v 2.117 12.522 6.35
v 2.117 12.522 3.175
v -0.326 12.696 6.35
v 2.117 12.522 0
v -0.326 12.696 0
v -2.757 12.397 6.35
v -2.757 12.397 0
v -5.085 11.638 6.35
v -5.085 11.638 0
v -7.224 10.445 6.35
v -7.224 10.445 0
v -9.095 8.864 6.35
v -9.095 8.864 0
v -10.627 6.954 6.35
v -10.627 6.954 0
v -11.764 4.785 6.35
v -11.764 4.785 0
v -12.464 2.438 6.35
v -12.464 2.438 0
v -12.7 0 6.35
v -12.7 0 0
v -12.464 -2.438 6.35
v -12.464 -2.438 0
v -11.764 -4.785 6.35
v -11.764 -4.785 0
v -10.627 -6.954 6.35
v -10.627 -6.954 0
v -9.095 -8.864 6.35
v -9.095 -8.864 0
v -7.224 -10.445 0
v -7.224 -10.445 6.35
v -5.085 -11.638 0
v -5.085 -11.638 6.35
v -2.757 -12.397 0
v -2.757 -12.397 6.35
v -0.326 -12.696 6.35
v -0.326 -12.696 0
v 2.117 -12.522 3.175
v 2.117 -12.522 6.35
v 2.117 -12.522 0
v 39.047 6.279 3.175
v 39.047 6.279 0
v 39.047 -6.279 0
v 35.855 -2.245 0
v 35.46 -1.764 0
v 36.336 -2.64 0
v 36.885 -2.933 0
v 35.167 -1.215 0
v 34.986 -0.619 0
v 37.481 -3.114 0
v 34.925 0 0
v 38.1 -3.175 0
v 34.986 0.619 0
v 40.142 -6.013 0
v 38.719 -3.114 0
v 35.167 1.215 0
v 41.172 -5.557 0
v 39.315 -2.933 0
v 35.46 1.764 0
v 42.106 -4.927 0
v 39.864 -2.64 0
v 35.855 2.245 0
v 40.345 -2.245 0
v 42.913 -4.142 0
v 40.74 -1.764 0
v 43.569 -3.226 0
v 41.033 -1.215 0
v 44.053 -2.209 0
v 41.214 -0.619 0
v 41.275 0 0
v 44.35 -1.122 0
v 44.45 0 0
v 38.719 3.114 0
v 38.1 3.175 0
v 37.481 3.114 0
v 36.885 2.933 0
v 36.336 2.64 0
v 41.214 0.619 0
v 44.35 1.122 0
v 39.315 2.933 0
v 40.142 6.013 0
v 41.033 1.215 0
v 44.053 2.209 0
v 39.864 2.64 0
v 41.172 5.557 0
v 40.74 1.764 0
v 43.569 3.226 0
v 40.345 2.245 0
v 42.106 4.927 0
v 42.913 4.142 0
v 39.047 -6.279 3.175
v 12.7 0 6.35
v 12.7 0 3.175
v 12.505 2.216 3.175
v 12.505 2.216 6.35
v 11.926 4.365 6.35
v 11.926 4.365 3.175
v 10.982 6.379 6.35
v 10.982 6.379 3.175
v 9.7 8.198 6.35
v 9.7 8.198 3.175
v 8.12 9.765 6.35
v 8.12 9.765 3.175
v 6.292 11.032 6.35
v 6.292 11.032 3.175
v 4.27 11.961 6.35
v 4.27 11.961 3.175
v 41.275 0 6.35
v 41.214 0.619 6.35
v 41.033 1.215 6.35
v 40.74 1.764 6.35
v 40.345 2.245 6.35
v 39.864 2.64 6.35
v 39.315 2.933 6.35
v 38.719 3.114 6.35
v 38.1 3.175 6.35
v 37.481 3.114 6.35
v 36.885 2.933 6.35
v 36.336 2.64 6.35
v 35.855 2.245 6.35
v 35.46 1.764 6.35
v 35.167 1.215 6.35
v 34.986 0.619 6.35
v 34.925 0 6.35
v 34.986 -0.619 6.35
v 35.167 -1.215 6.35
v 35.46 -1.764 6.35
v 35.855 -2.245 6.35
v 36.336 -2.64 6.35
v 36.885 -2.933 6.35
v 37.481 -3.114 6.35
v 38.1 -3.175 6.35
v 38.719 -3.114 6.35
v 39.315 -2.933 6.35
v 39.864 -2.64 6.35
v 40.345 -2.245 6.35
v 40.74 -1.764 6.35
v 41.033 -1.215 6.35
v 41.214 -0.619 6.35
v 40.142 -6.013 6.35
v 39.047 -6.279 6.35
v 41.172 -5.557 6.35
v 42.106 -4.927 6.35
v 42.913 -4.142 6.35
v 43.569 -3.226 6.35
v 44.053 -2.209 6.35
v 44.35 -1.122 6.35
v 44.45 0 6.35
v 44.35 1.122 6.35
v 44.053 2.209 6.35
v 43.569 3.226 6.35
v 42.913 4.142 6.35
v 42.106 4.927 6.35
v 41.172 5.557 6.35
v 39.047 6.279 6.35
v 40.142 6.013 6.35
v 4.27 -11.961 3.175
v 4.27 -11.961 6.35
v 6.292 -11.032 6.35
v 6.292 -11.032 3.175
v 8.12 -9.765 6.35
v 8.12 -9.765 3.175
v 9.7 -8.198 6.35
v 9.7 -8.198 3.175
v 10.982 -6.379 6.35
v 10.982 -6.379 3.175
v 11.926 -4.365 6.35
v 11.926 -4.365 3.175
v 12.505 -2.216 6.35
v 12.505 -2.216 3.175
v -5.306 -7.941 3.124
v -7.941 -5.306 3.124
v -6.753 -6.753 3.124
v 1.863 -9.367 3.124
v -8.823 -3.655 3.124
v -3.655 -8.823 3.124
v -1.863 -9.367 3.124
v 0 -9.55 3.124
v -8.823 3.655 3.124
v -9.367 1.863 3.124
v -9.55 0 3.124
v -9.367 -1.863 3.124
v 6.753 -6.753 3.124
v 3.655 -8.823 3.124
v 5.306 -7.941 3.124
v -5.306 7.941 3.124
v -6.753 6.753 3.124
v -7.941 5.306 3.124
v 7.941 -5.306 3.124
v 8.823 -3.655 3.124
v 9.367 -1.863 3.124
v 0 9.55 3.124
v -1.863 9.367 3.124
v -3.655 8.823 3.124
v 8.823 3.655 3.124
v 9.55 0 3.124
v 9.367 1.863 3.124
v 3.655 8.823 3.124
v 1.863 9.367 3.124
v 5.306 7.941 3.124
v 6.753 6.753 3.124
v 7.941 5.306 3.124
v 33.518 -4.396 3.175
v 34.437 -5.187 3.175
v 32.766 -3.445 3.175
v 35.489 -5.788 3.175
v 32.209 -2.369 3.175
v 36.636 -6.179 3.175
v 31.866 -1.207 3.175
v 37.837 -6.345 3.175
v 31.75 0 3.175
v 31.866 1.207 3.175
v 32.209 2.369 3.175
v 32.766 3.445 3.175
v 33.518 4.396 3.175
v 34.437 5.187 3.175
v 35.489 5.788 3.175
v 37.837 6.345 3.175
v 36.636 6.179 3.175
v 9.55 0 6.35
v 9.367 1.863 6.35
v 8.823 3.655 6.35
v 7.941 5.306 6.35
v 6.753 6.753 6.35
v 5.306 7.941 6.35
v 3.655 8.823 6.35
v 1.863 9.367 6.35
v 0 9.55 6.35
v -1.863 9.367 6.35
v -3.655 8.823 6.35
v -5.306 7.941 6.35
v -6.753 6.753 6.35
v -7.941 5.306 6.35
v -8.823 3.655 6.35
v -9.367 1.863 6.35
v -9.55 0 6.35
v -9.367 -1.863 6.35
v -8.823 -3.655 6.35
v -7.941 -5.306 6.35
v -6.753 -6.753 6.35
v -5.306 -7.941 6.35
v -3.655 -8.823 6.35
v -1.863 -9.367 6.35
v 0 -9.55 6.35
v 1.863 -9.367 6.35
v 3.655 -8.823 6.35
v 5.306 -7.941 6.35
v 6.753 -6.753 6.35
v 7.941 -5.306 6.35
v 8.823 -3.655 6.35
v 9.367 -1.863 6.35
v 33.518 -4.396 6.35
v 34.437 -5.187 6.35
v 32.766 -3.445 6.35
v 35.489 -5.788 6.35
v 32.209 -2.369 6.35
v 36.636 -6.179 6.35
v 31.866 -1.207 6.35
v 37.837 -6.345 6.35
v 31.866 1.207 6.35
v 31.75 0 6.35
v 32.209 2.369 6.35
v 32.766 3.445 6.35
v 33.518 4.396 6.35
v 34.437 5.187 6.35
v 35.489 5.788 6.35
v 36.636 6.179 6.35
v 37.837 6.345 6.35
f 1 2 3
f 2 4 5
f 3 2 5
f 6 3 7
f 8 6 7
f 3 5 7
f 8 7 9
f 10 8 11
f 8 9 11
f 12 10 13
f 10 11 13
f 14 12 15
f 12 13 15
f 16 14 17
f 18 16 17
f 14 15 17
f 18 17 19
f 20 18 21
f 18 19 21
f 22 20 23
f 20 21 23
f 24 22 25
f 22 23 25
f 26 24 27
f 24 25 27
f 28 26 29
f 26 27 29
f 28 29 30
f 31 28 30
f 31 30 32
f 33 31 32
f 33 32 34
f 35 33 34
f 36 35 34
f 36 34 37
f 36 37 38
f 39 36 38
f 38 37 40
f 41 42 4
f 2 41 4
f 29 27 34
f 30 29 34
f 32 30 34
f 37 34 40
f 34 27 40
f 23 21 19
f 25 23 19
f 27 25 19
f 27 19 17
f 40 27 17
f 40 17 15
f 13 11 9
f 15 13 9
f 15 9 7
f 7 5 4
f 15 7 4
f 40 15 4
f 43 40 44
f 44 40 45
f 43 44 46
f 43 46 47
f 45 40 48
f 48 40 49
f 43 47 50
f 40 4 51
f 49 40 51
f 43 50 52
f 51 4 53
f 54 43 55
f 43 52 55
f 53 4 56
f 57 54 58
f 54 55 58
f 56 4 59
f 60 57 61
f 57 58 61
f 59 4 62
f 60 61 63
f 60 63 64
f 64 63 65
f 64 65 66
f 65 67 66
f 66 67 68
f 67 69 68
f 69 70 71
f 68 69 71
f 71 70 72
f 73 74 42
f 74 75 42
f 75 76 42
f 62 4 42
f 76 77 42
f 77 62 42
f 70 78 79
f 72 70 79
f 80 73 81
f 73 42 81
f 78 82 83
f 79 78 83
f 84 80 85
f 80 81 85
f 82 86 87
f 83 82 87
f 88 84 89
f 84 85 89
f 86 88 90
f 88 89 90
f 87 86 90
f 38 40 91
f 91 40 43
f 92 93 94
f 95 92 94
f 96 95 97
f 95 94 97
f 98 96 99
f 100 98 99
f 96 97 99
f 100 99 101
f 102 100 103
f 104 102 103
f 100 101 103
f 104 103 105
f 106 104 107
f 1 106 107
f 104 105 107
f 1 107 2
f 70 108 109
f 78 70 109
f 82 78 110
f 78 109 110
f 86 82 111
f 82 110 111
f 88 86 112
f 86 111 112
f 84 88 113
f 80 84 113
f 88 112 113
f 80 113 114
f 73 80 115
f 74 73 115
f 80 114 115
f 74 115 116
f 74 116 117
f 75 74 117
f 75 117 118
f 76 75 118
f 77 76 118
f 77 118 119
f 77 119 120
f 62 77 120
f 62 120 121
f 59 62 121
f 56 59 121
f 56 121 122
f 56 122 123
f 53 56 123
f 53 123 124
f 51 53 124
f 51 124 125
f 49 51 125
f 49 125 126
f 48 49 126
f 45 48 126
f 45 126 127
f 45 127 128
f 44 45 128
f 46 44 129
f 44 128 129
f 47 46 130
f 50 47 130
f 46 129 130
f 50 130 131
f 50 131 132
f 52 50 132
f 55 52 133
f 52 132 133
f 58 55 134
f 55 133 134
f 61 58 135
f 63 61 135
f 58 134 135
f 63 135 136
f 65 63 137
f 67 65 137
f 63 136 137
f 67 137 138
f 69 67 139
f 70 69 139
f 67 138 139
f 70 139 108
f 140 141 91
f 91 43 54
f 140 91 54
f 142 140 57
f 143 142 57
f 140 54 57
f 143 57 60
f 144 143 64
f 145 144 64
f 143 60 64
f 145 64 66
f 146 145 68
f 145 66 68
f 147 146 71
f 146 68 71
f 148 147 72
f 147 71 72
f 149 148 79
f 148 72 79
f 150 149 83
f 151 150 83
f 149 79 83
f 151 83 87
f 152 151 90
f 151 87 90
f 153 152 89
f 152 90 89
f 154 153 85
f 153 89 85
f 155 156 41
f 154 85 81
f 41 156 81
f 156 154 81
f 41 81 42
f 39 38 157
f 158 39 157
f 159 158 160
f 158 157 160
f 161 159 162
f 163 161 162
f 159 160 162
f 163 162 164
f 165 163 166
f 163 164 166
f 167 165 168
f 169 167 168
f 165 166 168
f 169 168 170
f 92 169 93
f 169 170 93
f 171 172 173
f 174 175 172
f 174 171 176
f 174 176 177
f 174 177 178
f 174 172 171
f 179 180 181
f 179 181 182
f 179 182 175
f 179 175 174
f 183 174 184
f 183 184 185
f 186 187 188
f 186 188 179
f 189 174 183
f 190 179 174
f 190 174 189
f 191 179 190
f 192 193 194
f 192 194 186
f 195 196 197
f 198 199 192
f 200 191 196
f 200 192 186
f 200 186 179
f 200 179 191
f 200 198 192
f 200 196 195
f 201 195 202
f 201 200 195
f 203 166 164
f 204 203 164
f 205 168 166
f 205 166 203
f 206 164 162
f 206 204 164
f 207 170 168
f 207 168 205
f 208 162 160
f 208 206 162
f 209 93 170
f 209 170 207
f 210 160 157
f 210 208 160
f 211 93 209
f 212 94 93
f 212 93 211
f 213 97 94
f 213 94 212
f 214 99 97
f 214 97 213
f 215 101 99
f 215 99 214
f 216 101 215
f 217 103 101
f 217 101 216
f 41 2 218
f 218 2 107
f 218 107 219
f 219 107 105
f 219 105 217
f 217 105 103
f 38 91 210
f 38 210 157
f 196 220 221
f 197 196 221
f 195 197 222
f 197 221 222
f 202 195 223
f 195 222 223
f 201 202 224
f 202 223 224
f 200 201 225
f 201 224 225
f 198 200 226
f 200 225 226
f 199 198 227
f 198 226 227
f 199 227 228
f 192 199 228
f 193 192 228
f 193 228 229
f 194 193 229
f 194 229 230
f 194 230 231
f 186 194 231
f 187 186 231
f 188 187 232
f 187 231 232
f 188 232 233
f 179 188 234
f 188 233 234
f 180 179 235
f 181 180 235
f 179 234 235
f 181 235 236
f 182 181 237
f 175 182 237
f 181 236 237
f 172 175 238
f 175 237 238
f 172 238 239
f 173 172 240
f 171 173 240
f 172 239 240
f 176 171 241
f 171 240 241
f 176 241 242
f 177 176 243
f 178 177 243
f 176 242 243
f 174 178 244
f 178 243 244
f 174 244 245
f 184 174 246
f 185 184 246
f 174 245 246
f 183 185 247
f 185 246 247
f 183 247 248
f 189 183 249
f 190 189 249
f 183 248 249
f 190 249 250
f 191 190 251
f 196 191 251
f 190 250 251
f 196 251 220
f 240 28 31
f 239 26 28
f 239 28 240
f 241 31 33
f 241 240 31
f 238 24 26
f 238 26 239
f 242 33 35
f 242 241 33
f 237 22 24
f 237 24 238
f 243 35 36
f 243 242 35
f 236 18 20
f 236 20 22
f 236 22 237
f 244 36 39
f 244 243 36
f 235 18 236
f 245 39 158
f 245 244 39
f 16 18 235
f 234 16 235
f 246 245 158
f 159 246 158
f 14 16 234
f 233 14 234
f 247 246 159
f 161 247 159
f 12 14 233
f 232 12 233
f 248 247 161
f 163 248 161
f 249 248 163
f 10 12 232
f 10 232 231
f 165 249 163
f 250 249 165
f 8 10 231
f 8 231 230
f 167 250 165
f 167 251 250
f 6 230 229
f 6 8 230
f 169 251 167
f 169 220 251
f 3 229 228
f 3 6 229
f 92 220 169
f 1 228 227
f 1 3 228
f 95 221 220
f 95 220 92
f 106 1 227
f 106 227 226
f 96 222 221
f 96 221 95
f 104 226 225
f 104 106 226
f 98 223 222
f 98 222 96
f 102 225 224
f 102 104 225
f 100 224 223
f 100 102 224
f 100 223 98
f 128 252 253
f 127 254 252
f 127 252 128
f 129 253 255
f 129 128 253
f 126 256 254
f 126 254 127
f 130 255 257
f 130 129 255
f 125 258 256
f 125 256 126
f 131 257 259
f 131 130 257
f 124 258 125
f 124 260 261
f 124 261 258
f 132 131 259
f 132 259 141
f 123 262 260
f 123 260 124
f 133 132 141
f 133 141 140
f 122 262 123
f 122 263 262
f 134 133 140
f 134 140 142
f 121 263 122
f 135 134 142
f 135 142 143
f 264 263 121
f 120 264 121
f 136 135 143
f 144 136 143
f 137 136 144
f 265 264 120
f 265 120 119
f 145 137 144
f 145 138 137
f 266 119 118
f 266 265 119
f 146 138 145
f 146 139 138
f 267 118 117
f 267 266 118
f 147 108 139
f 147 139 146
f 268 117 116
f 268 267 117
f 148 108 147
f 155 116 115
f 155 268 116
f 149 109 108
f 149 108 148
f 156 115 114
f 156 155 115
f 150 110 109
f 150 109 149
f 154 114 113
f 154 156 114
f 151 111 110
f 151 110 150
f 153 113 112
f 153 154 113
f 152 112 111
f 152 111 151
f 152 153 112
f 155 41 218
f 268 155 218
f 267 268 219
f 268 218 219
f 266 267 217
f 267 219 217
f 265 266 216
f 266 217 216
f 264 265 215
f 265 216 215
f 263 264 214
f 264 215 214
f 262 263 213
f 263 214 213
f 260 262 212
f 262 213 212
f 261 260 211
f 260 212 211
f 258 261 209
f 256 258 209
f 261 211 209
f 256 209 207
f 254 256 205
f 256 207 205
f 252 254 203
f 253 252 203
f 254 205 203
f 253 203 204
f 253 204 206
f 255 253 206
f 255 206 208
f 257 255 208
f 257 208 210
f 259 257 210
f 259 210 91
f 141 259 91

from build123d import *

# Parameters (mm, degrees)
F1_DEPTH = 3.175
F3_DEPTH = 3.175
F4_R     = 9.5504
F5_DEPTH = 3.2258
F6_R     = 3.175
F7_DEPTH = 6.351


with BuildPart() as f1:
    # F0 (on Top) → F1 (new body)
    with BuildSketch(Plane.XY):
        with BuildLine():
            ThreePointArc((2.117, -12.522313), (9.699894, -8.197686), (12.7, 0))
            ThreePointArc((12.7, 0), (9.699894, 8.197686), (2.117, 12.522313))
            ThreePointArc((2.117, 12.522313), (-12.7, 0), (2.117, -12.522313))
        make_face()
        with BuildLine():
            ThreePointArc((2.117, 12.522313), (9.699894, 8.197686), (12.7, 0))
            ThreePointArc((12.7, 0), (9.699894, -8.197686), (2.117, -12.522313))
            Line((2.117, -12.522313), (39.047233, -6.278953))
            ThreePointArc((39.047233, -6.278953), (31.75, 0), (39.047233, 6.278953))
            Line((39.047233, 6.278953), (2.117, 12.522313))
        make_face()
        with BuildLine():
            ThreePointArc((44.45, 0), (42.913389, 4.141713), (39.047233, 6.278953))
            ThreePointArc((39.047233, 6.278953), (31.75, 0), (39.047233, -6.278953))
            ThreePointArc((39.047233, -6.278953), (42.913389, -4.141713), (44.45, 0))
        make_face()
    extrude(amount=F1_DEPTH)

    # F2 (on face) → F3 (join)
    with BuildSketch(Plane.XY.offset(3.175)):
        with BuildLine():
            ThreePointArc((39.047233, 6.278953), (31.75, 0), (39.047233, -6.278953))
            ThreePointArc((39.047233, -6.278953), (42.913389, -4.141713), (44.45, 0))
            ThreePointArc((44.45, 0), (42.913389, 4.141713), (39.047233, 6.278953))
        make_face()
        with BuildLine():
            ThreePointArc((12.7, 0), (9.699894, 8.197686), (2.117, 12.522313))
            ThreePointArc((2.117, 12.522313), (-12.7, 0), (2.117, -12.522313))
            ThreePointArc((2.117, -12.522313), (9.699894, -8.197686), (12.7, 0))
        make_face()
    extrude(amount=F3_DEPTH)

    # F4 (on face) → F5 (cut)
    with BuildSketch(Plane.XY.offset(6.35)):
        Circle(F4_R)
    extrude(amount=-F5_DEPTH, mode=Mode.SUBTRACT)

    # F6 (on face) → F7 (cut, through all)
    with BuildSketch(Plane.XY.offset(6.35)):
        with Locations((38.1, 0)):
            Circle(F6_R)
    extrude(amount=-F7_DEPTH, mode=Mode.SUBTRACT)


solid = f1.part
